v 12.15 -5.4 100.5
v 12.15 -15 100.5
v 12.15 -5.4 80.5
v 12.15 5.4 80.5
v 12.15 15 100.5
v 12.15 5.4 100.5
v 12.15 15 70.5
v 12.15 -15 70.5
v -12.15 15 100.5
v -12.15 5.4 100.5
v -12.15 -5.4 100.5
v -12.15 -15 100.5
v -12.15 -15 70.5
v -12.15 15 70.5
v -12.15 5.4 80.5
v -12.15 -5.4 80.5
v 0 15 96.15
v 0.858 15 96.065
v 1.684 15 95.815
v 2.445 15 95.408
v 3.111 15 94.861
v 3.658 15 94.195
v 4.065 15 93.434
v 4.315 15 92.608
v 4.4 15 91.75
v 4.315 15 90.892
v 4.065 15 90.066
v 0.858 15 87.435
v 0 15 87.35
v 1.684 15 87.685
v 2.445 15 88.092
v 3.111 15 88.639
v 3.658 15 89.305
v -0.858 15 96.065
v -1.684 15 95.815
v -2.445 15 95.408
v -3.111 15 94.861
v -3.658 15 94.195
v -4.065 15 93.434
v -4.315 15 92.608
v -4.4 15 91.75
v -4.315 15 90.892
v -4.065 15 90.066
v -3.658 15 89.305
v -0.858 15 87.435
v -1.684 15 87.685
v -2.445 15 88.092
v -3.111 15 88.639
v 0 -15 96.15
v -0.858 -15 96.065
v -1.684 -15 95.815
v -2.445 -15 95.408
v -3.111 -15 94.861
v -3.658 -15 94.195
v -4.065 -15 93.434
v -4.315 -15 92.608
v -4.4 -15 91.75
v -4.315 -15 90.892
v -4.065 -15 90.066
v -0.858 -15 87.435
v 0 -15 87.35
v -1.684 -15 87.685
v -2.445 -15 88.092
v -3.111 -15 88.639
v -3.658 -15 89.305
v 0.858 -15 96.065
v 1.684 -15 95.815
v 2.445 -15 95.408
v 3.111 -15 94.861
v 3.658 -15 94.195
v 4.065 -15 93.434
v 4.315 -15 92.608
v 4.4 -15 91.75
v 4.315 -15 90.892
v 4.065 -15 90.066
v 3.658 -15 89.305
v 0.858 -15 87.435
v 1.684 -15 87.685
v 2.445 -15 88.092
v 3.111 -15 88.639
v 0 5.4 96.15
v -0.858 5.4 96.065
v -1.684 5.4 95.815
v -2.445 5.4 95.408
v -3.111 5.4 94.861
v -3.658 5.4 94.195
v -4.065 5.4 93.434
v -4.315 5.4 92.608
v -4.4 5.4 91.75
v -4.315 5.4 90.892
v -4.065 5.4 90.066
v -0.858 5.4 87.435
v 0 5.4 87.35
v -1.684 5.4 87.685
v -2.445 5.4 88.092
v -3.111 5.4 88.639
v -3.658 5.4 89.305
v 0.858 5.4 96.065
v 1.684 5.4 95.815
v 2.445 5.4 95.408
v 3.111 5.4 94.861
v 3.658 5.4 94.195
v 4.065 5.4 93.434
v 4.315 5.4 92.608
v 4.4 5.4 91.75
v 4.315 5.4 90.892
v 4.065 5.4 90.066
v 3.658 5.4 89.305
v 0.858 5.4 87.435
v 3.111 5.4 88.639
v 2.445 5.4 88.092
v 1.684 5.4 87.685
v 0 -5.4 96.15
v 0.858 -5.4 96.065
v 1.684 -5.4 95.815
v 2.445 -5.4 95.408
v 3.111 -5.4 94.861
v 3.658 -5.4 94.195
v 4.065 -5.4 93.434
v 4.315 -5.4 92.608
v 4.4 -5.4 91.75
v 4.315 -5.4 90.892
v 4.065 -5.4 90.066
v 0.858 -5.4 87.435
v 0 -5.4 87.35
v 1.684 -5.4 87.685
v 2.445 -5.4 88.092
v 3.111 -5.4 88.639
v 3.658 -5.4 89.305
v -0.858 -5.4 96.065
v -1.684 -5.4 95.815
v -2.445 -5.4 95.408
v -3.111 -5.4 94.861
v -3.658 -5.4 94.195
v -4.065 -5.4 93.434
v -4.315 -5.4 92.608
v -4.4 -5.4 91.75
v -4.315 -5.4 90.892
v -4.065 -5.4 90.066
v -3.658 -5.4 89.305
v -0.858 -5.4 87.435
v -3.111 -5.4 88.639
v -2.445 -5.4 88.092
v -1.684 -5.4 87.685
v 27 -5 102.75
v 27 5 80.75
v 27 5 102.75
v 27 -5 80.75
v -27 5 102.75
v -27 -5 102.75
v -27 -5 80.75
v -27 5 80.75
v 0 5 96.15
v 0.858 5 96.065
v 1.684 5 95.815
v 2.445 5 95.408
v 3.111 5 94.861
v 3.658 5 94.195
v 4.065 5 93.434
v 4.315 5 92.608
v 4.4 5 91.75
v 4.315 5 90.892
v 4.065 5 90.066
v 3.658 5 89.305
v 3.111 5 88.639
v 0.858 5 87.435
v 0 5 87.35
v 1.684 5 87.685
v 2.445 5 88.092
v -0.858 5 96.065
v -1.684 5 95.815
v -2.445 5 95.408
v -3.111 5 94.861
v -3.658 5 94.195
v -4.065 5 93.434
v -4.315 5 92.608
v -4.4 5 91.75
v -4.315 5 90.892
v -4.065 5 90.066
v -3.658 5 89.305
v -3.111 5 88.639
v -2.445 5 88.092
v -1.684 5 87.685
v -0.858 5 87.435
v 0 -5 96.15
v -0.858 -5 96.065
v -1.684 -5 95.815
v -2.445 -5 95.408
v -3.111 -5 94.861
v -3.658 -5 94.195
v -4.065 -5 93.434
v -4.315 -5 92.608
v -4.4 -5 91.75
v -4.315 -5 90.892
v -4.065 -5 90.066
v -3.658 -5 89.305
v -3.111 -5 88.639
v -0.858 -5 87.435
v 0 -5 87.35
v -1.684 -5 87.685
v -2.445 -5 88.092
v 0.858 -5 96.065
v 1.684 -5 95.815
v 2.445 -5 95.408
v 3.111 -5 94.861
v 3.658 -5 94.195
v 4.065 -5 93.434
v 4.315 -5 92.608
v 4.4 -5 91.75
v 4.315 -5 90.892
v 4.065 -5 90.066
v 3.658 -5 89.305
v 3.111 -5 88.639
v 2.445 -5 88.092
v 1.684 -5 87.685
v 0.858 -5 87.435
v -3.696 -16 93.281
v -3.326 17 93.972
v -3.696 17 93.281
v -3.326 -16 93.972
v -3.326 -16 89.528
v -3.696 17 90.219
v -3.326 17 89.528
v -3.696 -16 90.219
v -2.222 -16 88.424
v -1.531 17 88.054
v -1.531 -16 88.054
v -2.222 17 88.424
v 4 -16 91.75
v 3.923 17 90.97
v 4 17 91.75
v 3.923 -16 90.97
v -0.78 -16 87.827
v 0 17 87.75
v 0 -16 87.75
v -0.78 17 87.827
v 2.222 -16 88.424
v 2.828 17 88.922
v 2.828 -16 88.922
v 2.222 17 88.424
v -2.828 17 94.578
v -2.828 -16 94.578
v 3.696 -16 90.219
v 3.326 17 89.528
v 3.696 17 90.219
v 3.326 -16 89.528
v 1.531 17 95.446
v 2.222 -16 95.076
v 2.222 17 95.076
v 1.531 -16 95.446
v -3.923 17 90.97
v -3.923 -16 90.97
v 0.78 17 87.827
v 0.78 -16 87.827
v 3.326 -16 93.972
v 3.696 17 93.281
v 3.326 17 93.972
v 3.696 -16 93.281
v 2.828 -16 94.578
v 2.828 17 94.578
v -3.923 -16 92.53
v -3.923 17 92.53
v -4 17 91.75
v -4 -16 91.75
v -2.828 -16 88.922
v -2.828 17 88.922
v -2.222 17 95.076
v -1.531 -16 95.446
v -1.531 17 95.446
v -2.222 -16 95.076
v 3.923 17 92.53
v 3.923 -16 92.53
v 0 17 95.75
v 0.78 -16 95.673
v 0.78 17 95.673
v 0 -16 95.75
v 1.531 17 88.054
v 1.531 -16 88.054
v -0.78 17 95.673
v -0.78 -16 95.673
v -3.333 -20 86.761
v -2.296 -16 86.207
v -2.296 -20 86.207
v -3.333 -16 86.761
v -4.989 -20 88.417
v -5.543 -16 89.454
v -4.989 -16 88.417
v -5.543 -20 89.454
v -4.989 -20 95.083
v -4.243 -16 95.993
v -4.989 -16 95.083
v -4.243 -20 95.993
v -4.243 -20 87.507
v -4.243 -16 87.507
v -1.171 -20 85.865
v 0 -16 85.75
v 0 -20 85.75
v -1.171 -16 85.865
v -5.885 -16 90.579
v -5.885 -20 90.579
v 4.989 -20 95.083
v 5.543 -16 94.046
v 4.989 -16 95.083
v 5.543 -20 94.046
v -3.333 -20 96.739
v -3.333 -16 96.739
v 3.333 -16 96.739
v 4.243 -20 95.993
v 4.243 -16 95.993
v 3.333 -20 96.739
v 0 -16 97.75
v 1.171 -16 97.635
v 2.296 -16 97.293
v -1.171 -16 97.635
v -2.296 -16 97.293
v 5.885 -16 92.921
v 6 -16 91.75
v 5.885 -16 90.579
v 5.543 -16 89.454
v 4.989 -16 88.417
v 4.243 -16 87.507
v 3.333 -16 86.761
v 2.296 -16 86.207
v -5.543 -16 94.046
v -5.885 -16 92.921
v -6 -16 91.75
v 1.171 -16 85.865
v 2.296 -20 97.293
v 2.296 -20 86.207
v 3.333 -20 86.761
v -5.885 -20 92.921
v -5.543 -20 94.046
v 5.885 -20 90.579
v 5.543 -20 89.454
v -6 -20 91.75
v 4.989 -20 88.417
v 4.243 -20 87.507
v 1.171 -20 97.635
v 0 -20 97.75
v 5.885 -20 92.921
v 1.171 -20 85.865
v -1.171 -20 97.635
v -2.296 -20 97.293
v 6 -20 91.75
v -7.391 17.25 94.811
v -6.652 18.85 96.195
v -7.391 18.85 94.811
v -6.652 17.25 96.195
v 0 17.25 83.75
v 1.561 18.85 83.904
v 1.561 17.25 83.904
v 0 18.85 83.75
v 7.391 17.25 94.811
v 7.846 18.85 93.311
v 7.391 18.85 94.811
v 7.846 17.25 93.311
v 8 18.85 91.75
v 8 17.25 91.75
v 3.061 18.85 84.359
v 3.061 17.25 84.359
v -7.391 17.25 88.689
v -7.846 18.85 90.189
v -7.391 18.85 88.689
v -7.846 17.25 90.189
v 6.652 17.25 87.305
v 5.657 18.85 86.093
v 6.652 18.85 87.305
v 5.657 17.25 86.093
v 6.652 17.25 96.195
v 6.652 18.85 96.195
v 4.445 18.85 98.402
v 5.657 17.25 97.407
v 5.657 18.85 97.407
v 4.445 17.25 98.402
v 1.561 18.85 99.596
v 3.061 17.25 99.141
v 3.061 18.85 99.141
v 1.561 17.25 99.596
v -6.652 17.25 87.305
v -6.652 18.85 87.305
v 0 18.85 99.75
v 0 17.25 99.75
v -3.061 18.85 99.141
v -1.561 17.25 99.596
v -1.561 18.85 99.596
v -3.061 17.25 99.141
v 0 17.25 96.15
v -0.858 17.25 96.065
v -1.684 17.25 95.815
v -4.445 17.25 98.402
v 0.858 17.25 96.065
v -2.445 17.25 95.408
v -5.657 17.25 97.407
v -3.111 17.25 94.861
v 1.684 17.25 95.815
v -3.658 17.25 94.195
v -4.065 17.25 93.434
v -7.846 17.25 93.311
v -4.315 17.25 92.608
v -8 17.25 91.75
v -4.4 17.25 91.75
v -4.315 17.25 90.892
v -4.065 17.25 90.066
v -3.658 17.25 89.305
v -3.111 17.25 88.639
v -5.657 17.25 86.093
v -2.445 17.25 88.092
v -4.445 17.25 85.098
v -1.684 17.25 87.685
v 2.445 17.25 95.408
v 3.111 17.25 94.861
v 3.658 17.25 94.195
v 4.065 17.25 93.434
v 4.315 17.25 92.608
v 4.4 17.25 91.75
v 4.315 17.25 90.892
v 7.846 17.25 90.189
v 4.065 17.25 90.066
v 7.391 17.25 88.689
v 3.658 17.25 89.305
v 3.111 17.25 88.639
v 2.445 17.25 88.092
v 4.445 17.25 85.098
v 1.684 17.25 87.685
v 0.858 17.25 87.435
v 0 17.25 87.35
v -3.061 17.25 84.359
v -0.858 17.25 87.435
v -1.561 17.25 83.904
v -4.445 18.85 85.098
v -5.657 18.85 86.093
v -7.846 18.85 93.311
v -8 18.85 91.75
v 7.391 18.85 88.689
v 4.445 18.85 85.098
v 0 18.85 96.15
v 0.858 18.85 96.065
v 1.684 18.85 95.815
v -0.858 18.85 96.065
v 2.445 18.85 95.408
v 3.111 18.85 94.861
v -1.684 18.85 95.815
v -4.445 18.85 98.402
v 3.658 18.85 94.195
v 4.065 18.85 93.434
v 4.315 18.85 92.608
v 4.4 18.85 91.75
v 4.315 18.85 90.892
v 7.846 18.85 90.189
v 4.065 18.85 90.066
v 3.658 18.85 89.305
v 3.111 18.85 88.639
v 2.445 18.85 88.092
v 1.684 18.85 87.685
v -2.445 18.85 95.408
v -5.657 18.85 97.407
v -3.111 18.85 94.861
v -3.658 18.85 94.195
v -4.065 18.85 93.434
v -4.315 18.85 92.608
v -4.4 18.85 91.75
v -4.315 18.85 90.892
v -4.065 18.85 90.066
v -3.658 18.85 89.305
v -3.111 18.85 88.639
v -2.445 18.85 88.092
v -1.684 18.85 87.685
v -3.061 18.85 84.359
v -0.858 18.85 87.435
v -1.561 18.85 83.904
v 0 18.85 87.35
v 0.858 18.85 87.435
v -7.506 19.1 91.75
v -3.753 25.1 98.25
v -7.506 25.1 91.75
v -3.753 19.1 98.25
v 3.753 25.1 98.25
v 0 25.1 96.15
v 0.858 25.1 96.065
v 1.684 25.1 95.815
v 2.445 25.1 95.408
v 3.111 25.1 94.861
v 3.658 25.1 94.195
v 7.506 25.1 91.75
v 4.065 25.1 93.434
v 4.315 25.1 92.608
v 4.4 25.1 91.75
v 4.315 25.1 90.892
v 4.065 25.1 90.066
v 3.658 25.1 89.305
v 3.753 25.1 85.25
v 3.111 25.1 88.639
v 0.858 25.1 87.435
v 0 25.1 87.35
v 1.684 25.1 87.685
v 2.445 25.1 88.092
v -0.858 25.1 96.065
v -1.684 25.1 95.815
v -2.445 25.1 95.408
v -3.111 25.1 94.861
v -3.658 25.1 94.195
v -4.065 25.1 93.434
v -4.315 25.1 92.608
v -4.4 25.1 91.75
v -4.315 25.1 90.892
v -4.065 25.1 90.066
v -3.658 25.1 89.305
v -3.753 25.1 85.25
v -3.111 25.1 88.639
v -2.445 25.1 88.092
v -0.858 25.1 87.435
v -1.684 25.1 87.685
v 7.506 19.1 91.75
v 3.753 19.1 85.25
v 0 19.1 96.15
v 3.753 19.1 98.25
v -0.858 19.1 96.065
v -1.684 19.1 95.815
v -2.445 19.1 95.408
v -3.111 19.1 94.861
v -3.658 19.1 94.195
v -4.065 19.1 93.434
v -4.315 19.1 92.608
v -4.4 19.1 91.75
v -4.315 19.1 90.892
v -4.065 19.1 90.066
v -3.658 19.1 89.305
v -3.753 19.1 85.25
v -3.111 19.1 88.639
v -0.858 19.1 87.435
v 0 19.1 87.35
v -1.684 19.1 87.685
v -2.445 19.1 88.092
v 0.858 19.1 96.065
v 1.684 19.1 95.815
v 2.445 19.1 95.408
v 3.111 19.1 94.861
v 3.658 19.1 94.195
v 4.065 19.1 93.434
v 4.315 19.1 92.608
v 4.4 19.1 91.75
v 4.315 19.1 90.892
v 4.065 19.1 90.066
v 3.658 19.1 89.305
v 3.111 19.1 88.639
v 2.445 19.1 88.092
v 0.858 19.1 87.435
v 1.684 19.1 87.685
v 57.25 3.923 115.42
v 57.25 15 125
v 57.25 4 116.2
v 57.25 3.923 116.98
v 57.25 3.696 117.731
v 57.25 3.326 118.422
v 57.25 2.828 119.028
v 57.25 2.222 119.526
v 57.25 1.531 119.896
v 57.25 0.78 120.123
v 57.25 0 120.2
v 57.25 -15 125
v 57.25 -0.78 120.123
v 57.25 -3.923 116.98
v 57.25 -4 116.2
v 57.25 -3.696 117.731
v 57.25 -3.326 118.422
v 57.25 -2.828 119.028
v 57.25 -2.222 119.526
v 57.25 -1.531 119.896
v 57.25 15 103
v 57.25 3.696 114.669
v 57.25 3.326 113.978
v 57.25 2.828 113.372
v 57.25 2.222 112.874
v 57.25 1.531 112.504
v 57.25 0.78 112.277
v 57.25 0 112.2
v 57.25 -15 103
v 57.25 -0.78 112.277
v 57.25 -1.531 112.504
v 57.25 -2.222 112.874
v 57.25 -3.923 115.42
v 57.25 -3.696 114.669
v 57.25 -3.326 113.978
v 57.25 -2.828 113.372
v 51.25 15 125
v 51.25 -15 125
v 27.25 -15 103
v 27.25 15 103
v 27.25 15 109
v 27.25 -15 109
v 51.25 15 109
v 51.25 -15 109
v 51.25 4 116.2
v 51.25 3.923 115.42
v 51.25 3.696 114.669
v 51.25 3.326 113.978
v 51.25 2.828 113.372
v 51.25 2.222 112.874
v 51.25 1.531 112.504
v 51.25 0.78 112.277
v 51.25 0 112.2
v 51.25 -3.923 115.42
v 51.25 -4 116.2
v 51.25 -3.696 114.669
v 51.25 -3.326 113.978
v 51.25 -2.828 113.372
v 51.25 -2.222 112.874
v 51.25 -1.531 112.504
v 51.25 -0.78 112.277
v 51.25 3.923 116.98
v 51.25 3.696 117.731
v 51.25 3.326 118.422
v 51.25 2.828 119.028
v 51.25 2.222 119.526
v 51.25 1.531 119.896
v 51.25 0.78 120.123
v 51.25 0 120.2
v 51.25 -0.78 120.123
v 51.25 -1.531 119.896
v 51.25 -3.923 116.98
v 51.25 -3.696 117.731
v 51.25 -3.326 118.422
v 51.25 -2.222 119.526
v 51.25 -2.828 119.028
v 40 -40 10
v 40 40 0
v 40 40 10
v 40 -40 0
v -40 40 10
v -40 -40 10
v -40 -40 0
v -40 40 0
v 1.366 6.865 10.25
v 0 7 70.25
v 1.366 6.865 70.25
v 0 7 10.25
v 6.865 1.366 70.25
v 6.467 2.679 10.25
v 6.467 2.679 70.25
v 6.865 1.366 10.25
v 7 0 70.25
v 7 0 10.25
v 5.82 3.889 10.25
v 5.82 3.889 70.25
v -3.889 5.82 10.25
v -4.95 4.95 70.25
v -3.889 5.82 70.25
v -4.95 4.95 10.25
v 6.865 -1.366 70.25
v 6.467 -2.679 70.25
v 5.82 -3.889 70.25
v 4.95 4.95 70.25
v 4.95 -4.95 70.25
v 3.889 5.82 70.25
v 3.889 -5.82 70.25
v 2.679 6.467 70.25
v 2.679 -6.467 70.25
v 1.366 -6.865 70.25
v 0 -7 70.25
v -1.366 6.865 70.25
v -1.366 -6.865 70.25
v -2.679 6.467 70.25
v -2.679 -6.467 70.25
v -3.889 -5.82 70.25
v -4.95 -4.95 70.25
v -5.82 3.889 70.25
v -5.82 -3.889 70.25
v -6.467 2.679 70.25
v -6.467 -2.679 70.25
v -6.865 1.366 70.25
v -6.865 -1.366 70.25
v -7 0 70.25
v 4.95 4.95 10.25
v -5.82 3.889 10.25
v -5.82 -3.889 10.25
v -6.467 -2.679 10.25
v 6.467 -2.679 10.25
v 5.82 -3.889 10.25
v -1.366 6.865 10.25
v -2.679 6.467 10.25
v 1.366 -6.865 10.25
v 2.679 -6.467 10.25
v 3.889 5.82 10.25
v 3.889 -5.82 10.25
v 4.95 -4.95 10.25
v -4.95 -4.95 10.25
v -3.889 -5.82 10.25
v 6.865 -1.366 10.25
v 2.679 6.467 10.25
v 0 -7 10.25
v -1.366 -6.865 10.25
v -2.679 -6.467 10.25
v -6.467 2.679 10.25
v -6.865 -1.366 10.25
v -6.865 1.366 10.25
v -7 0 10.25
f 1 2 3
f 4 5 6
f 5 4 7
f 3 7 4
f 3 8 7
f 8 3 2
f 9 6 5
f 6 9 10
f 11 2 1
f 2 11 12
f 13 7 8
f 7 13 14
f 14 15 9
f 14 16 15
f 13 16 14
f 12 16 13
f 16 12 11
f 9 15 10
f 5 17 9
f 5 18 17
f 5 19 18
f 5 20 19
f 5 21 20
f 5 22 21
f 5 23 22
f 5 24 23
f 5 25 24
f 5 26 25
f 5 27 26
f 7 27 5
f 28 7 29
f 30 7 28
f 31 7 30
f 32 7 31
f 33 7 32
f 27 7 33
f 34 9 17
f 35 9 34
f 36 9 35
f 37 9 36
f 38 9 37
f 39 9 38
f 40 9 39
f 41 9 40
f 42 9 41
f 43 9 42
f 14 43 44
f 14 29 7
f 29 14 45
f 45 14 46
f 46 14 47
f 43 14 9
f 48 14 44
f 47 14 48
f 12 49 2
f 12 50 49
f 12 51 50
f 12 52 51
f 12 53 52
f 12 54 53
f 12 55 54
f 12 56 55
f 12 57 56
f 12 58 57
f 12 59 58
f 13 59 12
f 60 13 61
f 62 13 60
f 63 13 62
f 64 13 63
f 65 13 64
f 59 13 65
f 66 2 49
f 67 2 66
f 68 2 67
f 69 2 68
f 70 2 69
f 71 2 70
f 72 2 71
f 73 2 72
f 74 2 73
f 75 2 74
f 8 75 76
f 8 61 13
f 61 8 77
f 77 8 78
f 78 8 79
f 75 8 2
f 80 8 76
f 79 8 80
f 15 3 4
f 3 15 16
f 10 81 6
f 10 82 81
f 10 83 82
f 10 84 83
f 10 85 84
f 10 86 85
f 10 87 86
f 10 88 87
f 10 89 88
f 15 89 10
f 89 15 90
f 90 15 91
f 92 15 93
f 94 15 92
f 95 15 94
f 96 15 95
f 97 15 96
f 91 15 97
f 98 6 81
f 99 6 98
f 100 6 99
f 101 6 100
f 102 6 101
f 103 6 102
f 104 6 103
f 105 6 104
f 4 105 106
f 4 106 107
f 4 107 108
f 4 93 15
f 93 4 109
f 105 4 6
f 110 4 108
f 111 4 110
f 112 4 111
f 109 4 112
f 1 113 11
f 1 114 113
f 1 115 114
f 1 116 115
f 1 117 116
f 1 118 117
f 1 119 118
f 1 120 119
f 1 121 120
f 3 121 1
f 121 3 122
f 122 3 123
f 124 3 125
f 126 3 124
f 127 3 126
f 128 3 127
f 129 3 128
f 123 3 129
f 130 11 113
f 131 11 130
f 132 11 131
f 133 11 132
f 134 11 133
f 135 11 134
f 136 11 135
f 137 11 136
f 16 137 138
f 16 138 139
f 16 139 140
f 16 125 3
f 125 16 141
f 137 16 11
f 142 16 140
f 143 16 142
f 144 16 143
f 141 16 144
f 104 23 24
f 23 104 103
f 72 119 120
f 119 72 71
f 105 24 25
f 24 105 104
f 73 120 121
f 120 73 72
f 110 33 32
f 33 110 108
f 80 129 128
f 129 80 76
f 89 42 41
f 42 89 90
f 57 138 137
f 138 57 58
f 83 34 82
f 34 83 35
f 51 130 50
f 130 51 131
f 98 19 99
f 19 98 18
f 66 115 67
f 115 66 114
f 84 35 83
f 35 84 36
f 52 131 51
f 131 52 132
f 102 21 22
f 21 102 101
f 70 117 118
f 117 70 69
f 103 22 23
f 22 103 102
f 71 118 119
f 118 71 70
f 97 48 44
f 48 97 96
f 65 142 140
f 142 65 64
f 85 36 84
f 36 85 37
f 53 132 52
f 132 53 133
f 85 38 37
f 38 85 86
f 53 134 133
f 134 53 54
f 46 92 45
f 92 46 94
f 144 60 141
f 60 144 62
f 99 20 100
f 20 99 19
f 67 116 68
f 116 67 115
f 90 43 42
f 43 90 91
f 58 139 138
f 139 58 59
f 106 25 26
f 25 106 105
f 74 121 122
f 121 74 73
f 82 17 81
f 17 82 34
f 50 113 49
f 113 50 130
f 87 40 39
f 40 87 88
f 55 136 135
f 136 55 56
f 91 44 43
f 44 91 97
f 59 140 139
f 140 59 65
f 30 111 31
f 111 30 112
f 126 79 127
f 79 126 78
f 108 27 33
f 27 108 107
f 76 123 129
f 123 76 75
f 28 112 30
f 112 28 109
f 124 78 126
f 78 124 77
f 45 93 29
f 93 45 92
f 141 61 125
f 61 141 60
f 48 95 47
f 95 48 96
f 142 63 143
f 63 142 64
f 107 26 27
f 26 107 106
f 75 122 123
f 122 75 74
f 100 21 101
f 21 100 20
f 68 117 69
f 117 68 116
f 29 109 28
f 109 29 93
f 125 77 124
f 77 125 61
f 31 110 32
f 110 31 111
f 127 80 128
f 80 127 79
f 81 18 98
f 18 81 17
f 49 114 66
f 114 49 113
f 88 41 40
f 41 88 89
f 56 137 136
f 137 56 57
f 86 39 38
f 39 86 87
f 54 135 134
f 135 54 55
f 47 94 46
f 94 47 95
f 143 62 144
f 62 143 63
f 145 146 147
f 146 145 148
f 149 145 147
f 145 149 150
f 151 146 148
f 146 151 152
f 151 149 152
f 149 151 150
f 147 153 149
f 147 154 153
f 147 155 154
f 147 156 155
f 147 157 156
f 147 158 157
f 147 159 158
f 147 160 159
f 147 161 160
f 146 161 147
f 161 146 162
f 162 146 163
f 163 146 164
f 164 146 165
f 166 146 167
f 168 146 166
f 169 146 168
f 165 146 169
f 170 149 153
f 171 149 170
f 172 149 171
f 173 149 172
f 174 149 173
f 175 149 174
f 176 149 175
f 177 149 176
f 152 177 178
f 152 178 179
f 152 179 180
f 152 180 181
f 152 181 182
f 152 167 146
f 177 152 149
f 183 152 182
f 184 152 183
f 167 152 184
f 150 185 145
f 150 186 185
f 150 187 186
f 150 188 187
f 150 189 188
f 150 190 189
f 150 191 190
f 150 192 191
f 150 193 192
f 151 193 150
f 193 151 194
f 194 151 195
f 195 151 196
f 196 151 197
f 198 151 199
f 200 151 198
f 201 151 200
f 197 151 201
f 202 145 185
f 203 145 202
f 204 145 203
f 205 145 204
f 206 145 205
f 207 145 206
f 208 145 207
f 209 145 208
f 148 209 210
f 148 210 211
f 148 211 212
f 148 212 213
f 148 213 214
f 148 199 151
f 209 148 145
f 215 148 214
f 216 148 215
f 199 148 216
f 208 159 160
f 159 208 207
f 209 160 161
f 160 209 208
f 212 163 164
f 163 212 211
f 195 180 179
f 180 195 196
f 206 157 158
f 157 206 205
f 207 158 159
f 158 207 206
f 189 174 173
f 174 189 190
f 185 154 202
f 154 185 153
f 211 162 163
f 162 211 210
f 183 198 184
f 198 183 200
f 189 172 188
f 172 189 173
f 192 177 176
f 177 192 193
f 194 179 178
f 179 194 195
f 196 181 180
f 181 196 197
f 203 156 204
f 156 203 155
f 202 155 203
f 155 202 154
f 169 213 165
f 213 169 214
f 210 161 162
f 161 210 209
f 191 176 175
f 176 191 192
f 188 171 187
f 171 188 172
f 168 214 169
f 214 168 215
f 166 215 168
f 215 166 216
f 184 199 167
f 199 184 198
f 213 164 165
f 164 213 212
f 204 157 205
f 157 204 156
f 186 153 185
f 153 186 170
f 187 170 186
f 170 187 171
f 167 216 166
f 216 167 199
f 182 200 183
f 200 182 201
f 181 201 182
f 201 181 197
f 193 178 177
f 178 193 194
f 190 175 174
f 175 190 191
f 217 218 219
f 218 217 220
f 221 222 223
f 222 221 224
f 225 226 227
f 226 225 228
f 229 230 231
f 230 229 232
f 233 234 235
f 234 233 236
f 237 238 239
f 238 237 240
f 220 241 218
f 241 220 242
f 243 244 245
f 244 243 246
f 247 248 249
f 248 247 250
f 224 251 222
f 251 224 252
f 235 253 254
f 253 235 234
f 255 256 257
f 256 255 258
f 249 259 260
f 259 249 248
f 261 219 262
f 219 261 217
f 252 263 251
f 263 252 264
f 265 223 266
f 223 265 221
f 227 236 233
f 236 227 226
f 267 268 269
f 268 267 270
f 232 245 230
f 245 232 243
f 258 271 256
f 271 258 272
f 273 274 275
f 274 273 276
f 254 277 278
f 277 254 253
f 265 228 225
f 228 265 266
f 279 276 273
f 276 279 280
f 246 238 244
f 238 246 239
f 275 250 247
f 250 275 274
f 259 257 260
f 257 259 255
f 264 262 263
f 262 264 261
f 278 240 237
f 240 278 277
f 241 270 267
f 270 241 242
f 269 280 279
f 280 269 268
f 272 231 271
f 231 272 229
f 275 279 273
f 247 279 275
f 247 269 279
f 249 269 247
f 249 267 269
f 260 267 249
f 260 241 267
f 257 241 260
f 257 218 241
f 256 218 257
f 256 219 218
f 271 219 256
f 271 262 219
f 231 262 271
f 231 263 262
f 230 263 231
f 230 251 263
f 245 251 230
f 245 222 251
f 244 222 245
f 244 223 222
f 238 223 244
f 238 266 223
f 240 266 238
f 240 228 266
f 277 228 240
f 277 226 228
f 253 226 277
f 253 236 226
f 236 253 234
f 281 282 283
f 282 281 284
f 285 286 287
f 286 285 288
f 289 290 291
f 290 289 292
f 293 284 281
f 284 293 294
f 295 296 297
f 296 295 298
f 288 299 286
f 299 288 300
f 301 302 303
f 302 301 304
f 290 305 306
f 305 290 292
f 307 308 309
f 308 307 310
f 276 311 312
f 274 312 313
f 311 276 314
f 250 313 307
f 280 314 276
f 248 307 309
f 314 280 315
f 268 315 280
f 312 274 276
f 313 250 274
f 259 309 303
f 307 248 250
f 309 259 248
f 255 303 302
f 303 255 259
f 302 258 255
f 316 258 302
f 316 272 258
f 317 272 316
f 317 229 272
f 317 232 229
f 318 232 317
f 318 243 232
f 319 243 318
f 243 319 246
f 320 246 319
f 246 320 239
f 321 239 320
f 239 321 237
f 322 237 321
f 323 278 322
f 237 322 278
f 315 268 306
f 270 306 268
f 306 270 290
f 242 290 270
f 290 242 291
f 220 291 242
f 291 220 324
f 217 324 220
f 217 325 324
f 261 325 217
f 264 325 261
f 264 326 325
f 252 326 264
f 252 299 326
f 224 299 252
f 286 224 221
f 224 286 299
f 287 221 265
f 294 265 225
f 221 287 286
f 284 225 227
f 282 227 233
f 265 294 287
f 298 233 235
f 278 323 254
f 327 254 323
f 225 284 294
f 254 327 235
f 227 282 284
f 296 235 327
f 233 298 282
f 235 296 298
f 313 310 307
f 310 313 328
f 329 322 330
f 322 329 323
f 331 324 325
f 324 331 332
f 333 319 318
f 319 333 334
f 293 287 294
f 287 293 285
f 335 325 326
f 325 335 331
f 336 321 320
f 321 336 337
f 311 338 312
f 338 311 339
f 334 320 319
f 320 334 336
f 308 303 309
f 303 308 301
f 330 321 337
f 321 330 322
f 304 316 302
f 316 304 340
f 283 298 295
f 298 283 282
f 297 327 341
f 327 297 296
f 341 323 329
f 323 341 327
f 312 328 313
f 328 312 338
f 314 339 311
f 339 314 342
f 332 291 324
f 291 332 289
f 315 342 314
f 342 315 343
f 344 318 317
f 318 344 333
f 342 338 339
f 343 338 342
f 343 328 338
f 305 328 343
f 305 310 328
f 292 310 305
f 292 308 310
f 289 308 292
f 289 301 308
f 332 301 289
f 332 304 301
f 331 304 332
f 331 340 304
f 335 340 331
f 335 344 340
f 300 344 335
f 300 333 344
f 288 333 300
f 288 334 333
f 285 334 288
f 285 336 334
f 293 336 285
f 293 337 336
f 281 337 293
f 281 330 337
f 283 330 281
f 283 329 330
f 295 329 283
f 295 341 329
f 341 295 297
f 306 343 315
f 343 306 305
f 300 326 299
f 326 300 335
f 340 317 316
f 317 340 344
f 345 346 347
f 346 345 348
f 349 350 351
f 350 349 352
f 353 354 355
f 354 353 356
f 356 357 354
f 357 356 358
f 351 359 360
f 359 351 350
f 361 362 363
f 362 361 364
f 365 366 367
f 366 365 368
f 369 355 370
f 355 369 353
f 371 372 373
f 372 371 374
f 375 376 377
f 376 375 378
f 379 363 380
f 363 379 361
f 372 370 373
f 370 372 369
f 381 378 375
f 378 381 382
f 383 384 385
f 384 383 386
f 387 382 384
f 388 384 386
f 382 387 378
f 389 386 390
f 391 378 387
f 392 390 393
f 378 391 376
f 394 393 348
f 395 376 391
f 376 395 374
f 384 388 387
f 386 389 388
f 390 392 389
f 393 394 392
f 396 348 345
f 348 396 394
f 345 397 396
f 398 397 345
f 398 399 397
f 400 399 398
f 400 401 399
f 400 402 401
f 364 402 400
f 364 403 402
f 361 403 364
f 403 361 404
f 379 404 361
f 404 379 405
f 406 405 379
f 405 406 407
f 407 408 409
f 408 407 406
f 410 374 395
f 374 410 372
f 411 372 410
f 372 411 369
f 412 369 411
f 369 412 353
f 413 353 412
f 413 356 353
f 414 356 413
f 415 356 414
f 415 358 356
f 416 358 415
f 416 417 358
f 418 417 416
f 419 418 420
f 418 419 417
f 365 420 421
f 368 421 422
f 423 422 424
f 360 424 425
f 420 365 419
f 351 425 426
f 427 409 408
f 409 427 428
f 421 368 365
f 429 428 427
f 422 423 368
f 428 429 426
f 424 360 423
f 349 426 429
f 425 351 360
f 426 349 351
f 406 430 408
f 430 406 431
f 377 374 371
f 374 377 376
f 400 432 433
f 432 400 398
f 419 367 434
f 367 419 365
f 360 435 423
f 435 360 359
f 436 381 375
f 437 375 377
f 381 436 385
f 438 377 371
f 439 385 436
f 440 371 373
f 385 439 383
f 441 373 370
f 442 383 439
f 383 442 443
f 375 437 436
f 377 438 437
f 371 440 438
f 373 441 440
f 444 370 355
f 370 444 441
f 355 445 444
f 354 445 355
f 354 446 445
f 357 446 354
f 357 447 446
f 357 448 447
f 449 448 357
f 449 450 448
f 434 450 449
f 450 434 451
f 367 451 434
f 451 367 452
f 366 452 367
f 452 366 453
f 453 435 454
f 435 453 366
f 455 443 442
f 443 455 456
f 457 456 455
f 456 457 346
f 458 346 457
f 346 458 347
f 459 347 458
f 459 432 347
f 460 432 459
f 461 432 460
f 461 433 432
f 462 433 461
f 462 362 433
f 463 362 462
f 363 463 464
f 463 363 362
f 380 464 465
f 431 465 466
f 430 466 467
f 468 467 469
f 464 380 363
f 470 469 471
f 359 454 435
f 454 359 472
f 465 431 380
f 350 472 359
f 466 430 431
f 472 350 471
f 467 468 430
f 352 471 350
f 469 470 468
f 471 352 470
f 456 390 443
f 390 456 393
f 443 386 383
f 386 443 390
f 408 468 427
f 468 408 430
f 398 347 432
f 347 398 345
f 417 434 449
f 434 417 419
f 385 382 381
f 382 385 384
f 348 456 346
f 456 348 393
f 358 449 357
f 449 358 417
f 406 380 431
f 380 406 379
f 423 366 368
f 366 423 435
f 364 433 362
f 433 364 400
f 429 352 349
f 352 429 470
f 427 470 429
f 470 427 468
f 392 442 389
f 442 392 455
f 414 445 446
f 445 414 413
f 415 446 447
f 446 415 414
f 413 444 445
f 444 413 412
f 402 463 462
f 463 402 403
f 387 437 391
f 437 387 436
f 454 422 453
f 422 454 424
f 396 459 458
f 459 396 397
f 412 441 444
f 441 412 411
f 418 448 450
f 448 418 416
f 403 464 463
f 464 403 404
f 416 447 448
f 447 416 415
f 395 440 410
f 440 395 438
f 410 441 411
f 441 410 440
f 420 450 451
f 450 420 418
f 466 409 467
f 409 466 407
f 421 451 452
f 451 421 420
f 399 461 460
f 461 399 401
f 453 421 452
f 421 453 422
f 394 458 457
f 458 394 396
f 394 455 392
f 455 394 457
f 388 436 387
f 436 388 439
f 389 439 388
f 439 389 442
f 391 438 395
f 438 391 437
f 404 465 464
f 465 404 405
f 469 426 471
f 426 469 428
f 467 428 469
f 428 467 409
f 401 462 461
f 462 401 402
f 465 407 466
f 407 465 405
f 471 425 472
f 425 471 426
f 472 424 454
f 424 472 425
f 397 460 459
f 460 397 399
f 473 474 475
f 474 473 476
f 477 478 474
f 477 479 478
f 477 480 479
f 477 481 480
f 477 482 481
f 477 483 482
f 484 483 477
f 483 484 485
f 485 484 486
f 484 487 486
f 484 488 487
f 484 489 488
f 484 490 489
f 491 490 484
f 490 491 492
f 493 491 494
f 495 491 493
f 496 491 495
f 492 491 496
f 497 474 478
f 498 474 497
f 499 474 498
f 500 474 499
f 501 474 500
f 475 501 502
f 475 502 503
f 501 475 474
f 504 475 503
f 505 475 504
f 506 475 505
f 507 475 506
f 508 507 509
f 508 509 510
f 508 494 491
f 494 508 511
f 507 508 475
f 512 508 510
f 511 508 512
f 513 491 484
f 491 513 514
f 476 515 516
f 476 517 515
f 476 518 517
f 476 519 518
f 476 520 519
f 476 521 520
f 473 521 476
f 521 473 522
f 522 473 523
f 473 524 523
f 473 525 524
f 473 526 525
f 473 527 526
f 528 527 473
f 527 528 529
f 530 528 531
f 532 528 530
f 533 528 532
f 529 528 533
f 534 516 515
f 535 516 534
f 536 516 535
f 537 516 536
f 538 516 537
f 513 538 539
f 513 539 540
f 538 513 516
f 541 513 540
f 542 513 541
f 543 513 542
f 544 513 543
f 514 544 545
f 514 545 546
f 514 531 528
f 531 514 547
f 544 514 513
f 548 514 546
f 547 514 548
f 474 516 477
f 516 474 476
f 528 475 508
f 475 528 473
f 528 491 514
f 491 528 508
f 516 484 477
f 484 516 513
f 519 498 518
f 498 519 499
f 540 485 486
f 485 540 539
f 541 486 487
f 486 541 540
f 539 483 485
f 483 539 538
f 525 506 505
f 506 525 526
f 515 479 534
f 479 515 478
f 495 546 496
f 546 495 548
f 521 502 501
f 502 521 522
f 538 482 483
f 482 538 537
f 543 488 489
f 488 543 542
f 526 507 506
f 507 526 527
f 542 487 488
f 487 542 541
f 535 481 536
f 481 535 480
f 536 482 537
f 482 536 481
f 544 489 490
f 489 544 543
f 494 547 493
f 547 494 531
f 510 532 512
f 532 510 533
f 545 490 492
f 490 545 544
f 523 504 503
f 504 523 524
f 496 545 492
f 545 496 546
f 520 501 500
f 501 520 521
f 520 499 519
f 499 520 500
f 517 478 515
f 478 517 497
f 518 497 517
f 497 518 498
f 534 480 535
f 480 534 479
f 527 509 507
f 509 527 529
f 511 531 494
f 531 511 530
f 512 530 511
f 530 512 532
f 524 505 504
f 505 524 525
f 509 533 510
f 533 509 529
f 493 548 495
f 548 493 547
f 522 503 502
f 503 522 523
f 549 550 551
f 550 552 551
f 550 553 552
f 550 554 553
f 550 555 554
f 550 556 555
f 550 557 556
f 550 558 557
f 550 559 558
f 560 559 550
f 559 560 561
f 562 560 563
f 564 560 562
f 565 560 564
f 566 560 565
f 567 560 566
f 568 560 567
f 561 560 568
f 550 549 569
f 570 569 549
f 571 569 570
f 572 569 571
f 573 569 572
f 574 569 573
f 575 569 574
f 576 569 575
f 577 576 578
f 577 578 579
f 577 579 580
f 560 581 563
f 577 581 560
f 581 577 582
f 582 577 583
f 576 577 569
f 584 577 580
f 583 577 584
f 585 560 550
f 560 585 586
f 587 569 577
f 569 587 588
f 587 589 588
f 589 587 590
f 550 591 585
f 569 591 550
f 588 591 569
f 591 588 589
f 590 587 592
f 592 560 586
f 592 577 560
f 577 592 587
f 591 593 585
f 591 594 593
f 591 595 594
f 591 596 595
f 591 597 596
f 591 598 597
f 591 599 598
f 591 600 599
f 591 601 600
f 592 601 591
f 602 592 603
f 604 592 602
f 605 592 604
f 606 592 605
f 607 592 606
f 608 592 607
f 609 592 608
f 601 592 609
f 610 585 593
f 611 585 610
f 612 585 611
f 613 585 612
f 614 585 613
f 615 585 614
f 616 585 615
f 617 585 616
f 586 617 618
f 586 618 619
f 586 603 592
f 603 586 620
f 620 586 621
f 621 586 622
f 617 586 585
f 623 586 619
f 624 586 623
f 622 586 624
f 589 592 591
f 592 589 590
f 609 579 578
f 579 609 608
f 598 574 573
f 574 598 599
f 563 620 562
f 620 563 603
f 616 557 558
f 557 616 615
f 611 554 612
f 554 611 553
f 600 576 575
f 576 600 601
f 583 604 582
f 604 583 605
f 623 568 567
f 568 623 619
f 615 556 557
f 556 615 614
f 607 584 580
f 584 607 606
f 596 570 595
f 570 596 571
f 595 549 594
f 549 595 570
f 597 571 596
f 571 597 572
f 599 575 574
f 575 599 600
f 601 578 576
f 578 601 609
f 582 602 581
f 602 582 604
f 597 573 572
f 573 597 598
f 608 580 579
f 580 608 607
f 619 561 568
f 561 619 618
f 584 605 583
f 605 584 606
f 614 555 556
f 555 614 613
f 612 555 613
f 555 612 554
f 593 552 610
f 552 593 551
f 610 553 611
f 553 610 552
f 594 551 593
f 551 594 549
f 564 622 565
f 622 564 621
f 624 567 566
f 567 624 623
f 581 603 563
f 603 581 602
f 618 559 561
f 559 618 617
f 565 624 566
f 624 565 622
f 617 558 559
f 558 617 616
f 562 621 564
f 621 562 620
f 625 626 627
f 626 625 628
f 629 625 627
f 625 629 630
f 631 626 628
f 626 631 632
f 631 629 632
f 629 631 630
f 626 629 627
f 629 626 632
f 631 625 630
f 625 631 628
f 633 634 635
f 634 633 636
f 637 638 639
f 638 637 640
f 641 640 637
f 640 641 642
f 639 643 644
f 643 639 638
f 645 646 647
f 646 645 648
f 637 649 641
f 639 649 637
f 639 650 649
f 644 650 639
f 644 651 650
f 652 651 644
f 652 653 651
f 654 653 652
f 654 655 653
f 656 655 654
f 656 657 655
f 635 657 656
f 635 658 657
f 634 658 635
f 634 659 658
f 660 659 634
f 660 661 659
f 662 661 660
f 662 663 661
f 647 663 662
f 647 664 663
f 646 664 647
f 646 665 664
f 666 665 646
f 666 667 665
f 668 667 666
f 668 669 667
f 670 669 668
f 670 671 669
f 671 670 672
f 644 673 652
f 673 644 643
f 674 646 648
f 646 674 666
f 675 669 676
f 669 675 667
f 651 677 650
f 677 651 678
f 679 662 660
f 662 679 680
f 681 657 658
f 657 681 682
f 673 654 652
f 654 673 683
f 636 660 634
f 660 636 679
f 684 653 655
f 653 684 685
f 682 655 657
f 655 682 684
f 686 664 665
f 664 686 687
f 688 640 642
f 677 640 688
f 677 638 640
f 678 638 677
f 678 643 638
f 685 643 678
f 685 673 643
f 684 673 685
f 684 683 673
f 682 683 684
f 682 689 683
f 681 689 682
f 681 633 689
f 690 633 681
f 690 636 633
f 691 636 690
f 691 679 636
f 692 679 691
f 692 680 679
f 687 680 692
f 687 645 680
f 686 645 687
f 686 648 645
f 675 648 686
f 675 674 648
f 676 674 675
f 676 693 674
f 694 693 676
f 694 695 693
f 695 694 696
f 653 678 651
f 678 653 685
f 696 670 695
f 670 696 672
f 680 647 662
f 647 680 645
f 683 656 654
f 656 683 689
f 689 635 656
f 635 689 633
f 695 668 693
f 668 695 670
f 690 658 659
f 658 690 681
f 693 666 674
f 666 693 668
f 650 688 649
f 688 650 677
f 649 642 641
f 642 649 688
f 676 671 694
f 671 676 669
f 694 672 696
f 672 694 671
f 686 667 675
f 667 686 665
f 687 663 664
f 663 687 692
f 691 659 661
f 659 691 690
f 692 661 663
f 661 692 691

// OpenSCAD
$fn = 32;

// ------------------------------------------------------------------------
// Lamp arm: column d14 x 60 mm, arm 54 mm
// Every part is its own module, assembly() places every instance.
// ------------------------------------------------------------------------

// --- part 1 ---
module lamp_base() {
  difference() {
    translate([-40, -40, 0]) cube([80, 80, 10]);
  }
}

// --- part 2 ---
module lamp_column() {
  cylinder(h = 60, d = 14);
}

// --- part 3 ---
module head_fork() {
  difference() {
    translate([-12.15, -15, 0]) cube([24.3, 30, 30]);
    translate([-13.15, -5.4, 10]) cube([26.3, 10.8, 21]);
    translate([0, 0, 21.25]) rotate([90, 0, 0]) cylinder(h = 32, d = 8.8, center = true);
  }
}

// --- part 4 ---
module lamp_arm() {
  difference() {
    translate([-27, -5, 0]) cube([54, 10, 22]);
    translate([0, 0, 11]) rotate([90, 0, 0]) cylinder(h = 12, d = 8.8, center = true);
  }
}

// --- part 5 ---
module arm_pin() {
  rotate([0, 90, 0]) cylinder(h = 34, d = 8, center = true);
  translate([-20, 0, 0]) rotate([0, 90, 0]) cylinder(h = 4, d = 12);
}

// --- part 6 ---
module arm_washer() {
  difference() {
      translate([0, 0, 0]) cylinder(h = 1.6, d = 16);
      translate([0, 0, -1]) cylinder(h = 3.6, d = 8.8);
    }
}

// --- part 7 ---
module arm_nut() {
  difference() {
    linear_extrude(height = 6) polygon(points = [[7.506, 0], [3.753, 6.5], [-3.753, 6.5], [-7.506, 0], [-3.753, -6.5], [3.753, -6.5]]);
    translate([0, 0, -1]) cylinder(h = 8, d = 8.8);
  }
}

// --- part 8 ---
module shade_bracket() {
  difference() {
    translate([-15, -15, 0]) cube([30, 30, 22]);
    translate([-16, -16, 6]) cube([25, 32, 17]);
    translate([12, 0, 13.2]) rotate([0, 90, 0]) cylinder(h = 8, d = 8, center = true);
  }
}

// --- assembly ---
module assembly() {
  color([0.80, 0.24, 0.20]) translate([0, 0, 0]) rotate([0, 0, 0]) lamp_base();
  color([0.20, 0.45, 0.75]) translate([0, 0, 10.25]) rotate([0, 0, 0]) lamp_column();
  color([0.25, 0.62, 0.32]) translate([0, 0, 70.5]) rotate([0, 0, 0]) head_fork();
  color([0.92, 0.70, 0.18]) translate([0, 0, 80.75]) rotate([0, 0, 0]) lamp_arm();
  color([0.58, 0.35, 0.70]) translate([0, 0, 91.75]) rotate([0, 0, 90]) arm_pin();
  color([0.16, 0.66, 0.66]) translate([0, 18.85, 91.75]) rotate([90, 0, 0]) arm_washer();
  color([0.85, 0.48, 0.18]) translate([0, 25.1, 91.75]) rotate([90, 0, 0]) arm_nut();
  color([0.55, 0.60, 0.65]) translate([42.25, 0, 103]) rotate([0, 0, 0]) shade_bracket();
}

assembly();
